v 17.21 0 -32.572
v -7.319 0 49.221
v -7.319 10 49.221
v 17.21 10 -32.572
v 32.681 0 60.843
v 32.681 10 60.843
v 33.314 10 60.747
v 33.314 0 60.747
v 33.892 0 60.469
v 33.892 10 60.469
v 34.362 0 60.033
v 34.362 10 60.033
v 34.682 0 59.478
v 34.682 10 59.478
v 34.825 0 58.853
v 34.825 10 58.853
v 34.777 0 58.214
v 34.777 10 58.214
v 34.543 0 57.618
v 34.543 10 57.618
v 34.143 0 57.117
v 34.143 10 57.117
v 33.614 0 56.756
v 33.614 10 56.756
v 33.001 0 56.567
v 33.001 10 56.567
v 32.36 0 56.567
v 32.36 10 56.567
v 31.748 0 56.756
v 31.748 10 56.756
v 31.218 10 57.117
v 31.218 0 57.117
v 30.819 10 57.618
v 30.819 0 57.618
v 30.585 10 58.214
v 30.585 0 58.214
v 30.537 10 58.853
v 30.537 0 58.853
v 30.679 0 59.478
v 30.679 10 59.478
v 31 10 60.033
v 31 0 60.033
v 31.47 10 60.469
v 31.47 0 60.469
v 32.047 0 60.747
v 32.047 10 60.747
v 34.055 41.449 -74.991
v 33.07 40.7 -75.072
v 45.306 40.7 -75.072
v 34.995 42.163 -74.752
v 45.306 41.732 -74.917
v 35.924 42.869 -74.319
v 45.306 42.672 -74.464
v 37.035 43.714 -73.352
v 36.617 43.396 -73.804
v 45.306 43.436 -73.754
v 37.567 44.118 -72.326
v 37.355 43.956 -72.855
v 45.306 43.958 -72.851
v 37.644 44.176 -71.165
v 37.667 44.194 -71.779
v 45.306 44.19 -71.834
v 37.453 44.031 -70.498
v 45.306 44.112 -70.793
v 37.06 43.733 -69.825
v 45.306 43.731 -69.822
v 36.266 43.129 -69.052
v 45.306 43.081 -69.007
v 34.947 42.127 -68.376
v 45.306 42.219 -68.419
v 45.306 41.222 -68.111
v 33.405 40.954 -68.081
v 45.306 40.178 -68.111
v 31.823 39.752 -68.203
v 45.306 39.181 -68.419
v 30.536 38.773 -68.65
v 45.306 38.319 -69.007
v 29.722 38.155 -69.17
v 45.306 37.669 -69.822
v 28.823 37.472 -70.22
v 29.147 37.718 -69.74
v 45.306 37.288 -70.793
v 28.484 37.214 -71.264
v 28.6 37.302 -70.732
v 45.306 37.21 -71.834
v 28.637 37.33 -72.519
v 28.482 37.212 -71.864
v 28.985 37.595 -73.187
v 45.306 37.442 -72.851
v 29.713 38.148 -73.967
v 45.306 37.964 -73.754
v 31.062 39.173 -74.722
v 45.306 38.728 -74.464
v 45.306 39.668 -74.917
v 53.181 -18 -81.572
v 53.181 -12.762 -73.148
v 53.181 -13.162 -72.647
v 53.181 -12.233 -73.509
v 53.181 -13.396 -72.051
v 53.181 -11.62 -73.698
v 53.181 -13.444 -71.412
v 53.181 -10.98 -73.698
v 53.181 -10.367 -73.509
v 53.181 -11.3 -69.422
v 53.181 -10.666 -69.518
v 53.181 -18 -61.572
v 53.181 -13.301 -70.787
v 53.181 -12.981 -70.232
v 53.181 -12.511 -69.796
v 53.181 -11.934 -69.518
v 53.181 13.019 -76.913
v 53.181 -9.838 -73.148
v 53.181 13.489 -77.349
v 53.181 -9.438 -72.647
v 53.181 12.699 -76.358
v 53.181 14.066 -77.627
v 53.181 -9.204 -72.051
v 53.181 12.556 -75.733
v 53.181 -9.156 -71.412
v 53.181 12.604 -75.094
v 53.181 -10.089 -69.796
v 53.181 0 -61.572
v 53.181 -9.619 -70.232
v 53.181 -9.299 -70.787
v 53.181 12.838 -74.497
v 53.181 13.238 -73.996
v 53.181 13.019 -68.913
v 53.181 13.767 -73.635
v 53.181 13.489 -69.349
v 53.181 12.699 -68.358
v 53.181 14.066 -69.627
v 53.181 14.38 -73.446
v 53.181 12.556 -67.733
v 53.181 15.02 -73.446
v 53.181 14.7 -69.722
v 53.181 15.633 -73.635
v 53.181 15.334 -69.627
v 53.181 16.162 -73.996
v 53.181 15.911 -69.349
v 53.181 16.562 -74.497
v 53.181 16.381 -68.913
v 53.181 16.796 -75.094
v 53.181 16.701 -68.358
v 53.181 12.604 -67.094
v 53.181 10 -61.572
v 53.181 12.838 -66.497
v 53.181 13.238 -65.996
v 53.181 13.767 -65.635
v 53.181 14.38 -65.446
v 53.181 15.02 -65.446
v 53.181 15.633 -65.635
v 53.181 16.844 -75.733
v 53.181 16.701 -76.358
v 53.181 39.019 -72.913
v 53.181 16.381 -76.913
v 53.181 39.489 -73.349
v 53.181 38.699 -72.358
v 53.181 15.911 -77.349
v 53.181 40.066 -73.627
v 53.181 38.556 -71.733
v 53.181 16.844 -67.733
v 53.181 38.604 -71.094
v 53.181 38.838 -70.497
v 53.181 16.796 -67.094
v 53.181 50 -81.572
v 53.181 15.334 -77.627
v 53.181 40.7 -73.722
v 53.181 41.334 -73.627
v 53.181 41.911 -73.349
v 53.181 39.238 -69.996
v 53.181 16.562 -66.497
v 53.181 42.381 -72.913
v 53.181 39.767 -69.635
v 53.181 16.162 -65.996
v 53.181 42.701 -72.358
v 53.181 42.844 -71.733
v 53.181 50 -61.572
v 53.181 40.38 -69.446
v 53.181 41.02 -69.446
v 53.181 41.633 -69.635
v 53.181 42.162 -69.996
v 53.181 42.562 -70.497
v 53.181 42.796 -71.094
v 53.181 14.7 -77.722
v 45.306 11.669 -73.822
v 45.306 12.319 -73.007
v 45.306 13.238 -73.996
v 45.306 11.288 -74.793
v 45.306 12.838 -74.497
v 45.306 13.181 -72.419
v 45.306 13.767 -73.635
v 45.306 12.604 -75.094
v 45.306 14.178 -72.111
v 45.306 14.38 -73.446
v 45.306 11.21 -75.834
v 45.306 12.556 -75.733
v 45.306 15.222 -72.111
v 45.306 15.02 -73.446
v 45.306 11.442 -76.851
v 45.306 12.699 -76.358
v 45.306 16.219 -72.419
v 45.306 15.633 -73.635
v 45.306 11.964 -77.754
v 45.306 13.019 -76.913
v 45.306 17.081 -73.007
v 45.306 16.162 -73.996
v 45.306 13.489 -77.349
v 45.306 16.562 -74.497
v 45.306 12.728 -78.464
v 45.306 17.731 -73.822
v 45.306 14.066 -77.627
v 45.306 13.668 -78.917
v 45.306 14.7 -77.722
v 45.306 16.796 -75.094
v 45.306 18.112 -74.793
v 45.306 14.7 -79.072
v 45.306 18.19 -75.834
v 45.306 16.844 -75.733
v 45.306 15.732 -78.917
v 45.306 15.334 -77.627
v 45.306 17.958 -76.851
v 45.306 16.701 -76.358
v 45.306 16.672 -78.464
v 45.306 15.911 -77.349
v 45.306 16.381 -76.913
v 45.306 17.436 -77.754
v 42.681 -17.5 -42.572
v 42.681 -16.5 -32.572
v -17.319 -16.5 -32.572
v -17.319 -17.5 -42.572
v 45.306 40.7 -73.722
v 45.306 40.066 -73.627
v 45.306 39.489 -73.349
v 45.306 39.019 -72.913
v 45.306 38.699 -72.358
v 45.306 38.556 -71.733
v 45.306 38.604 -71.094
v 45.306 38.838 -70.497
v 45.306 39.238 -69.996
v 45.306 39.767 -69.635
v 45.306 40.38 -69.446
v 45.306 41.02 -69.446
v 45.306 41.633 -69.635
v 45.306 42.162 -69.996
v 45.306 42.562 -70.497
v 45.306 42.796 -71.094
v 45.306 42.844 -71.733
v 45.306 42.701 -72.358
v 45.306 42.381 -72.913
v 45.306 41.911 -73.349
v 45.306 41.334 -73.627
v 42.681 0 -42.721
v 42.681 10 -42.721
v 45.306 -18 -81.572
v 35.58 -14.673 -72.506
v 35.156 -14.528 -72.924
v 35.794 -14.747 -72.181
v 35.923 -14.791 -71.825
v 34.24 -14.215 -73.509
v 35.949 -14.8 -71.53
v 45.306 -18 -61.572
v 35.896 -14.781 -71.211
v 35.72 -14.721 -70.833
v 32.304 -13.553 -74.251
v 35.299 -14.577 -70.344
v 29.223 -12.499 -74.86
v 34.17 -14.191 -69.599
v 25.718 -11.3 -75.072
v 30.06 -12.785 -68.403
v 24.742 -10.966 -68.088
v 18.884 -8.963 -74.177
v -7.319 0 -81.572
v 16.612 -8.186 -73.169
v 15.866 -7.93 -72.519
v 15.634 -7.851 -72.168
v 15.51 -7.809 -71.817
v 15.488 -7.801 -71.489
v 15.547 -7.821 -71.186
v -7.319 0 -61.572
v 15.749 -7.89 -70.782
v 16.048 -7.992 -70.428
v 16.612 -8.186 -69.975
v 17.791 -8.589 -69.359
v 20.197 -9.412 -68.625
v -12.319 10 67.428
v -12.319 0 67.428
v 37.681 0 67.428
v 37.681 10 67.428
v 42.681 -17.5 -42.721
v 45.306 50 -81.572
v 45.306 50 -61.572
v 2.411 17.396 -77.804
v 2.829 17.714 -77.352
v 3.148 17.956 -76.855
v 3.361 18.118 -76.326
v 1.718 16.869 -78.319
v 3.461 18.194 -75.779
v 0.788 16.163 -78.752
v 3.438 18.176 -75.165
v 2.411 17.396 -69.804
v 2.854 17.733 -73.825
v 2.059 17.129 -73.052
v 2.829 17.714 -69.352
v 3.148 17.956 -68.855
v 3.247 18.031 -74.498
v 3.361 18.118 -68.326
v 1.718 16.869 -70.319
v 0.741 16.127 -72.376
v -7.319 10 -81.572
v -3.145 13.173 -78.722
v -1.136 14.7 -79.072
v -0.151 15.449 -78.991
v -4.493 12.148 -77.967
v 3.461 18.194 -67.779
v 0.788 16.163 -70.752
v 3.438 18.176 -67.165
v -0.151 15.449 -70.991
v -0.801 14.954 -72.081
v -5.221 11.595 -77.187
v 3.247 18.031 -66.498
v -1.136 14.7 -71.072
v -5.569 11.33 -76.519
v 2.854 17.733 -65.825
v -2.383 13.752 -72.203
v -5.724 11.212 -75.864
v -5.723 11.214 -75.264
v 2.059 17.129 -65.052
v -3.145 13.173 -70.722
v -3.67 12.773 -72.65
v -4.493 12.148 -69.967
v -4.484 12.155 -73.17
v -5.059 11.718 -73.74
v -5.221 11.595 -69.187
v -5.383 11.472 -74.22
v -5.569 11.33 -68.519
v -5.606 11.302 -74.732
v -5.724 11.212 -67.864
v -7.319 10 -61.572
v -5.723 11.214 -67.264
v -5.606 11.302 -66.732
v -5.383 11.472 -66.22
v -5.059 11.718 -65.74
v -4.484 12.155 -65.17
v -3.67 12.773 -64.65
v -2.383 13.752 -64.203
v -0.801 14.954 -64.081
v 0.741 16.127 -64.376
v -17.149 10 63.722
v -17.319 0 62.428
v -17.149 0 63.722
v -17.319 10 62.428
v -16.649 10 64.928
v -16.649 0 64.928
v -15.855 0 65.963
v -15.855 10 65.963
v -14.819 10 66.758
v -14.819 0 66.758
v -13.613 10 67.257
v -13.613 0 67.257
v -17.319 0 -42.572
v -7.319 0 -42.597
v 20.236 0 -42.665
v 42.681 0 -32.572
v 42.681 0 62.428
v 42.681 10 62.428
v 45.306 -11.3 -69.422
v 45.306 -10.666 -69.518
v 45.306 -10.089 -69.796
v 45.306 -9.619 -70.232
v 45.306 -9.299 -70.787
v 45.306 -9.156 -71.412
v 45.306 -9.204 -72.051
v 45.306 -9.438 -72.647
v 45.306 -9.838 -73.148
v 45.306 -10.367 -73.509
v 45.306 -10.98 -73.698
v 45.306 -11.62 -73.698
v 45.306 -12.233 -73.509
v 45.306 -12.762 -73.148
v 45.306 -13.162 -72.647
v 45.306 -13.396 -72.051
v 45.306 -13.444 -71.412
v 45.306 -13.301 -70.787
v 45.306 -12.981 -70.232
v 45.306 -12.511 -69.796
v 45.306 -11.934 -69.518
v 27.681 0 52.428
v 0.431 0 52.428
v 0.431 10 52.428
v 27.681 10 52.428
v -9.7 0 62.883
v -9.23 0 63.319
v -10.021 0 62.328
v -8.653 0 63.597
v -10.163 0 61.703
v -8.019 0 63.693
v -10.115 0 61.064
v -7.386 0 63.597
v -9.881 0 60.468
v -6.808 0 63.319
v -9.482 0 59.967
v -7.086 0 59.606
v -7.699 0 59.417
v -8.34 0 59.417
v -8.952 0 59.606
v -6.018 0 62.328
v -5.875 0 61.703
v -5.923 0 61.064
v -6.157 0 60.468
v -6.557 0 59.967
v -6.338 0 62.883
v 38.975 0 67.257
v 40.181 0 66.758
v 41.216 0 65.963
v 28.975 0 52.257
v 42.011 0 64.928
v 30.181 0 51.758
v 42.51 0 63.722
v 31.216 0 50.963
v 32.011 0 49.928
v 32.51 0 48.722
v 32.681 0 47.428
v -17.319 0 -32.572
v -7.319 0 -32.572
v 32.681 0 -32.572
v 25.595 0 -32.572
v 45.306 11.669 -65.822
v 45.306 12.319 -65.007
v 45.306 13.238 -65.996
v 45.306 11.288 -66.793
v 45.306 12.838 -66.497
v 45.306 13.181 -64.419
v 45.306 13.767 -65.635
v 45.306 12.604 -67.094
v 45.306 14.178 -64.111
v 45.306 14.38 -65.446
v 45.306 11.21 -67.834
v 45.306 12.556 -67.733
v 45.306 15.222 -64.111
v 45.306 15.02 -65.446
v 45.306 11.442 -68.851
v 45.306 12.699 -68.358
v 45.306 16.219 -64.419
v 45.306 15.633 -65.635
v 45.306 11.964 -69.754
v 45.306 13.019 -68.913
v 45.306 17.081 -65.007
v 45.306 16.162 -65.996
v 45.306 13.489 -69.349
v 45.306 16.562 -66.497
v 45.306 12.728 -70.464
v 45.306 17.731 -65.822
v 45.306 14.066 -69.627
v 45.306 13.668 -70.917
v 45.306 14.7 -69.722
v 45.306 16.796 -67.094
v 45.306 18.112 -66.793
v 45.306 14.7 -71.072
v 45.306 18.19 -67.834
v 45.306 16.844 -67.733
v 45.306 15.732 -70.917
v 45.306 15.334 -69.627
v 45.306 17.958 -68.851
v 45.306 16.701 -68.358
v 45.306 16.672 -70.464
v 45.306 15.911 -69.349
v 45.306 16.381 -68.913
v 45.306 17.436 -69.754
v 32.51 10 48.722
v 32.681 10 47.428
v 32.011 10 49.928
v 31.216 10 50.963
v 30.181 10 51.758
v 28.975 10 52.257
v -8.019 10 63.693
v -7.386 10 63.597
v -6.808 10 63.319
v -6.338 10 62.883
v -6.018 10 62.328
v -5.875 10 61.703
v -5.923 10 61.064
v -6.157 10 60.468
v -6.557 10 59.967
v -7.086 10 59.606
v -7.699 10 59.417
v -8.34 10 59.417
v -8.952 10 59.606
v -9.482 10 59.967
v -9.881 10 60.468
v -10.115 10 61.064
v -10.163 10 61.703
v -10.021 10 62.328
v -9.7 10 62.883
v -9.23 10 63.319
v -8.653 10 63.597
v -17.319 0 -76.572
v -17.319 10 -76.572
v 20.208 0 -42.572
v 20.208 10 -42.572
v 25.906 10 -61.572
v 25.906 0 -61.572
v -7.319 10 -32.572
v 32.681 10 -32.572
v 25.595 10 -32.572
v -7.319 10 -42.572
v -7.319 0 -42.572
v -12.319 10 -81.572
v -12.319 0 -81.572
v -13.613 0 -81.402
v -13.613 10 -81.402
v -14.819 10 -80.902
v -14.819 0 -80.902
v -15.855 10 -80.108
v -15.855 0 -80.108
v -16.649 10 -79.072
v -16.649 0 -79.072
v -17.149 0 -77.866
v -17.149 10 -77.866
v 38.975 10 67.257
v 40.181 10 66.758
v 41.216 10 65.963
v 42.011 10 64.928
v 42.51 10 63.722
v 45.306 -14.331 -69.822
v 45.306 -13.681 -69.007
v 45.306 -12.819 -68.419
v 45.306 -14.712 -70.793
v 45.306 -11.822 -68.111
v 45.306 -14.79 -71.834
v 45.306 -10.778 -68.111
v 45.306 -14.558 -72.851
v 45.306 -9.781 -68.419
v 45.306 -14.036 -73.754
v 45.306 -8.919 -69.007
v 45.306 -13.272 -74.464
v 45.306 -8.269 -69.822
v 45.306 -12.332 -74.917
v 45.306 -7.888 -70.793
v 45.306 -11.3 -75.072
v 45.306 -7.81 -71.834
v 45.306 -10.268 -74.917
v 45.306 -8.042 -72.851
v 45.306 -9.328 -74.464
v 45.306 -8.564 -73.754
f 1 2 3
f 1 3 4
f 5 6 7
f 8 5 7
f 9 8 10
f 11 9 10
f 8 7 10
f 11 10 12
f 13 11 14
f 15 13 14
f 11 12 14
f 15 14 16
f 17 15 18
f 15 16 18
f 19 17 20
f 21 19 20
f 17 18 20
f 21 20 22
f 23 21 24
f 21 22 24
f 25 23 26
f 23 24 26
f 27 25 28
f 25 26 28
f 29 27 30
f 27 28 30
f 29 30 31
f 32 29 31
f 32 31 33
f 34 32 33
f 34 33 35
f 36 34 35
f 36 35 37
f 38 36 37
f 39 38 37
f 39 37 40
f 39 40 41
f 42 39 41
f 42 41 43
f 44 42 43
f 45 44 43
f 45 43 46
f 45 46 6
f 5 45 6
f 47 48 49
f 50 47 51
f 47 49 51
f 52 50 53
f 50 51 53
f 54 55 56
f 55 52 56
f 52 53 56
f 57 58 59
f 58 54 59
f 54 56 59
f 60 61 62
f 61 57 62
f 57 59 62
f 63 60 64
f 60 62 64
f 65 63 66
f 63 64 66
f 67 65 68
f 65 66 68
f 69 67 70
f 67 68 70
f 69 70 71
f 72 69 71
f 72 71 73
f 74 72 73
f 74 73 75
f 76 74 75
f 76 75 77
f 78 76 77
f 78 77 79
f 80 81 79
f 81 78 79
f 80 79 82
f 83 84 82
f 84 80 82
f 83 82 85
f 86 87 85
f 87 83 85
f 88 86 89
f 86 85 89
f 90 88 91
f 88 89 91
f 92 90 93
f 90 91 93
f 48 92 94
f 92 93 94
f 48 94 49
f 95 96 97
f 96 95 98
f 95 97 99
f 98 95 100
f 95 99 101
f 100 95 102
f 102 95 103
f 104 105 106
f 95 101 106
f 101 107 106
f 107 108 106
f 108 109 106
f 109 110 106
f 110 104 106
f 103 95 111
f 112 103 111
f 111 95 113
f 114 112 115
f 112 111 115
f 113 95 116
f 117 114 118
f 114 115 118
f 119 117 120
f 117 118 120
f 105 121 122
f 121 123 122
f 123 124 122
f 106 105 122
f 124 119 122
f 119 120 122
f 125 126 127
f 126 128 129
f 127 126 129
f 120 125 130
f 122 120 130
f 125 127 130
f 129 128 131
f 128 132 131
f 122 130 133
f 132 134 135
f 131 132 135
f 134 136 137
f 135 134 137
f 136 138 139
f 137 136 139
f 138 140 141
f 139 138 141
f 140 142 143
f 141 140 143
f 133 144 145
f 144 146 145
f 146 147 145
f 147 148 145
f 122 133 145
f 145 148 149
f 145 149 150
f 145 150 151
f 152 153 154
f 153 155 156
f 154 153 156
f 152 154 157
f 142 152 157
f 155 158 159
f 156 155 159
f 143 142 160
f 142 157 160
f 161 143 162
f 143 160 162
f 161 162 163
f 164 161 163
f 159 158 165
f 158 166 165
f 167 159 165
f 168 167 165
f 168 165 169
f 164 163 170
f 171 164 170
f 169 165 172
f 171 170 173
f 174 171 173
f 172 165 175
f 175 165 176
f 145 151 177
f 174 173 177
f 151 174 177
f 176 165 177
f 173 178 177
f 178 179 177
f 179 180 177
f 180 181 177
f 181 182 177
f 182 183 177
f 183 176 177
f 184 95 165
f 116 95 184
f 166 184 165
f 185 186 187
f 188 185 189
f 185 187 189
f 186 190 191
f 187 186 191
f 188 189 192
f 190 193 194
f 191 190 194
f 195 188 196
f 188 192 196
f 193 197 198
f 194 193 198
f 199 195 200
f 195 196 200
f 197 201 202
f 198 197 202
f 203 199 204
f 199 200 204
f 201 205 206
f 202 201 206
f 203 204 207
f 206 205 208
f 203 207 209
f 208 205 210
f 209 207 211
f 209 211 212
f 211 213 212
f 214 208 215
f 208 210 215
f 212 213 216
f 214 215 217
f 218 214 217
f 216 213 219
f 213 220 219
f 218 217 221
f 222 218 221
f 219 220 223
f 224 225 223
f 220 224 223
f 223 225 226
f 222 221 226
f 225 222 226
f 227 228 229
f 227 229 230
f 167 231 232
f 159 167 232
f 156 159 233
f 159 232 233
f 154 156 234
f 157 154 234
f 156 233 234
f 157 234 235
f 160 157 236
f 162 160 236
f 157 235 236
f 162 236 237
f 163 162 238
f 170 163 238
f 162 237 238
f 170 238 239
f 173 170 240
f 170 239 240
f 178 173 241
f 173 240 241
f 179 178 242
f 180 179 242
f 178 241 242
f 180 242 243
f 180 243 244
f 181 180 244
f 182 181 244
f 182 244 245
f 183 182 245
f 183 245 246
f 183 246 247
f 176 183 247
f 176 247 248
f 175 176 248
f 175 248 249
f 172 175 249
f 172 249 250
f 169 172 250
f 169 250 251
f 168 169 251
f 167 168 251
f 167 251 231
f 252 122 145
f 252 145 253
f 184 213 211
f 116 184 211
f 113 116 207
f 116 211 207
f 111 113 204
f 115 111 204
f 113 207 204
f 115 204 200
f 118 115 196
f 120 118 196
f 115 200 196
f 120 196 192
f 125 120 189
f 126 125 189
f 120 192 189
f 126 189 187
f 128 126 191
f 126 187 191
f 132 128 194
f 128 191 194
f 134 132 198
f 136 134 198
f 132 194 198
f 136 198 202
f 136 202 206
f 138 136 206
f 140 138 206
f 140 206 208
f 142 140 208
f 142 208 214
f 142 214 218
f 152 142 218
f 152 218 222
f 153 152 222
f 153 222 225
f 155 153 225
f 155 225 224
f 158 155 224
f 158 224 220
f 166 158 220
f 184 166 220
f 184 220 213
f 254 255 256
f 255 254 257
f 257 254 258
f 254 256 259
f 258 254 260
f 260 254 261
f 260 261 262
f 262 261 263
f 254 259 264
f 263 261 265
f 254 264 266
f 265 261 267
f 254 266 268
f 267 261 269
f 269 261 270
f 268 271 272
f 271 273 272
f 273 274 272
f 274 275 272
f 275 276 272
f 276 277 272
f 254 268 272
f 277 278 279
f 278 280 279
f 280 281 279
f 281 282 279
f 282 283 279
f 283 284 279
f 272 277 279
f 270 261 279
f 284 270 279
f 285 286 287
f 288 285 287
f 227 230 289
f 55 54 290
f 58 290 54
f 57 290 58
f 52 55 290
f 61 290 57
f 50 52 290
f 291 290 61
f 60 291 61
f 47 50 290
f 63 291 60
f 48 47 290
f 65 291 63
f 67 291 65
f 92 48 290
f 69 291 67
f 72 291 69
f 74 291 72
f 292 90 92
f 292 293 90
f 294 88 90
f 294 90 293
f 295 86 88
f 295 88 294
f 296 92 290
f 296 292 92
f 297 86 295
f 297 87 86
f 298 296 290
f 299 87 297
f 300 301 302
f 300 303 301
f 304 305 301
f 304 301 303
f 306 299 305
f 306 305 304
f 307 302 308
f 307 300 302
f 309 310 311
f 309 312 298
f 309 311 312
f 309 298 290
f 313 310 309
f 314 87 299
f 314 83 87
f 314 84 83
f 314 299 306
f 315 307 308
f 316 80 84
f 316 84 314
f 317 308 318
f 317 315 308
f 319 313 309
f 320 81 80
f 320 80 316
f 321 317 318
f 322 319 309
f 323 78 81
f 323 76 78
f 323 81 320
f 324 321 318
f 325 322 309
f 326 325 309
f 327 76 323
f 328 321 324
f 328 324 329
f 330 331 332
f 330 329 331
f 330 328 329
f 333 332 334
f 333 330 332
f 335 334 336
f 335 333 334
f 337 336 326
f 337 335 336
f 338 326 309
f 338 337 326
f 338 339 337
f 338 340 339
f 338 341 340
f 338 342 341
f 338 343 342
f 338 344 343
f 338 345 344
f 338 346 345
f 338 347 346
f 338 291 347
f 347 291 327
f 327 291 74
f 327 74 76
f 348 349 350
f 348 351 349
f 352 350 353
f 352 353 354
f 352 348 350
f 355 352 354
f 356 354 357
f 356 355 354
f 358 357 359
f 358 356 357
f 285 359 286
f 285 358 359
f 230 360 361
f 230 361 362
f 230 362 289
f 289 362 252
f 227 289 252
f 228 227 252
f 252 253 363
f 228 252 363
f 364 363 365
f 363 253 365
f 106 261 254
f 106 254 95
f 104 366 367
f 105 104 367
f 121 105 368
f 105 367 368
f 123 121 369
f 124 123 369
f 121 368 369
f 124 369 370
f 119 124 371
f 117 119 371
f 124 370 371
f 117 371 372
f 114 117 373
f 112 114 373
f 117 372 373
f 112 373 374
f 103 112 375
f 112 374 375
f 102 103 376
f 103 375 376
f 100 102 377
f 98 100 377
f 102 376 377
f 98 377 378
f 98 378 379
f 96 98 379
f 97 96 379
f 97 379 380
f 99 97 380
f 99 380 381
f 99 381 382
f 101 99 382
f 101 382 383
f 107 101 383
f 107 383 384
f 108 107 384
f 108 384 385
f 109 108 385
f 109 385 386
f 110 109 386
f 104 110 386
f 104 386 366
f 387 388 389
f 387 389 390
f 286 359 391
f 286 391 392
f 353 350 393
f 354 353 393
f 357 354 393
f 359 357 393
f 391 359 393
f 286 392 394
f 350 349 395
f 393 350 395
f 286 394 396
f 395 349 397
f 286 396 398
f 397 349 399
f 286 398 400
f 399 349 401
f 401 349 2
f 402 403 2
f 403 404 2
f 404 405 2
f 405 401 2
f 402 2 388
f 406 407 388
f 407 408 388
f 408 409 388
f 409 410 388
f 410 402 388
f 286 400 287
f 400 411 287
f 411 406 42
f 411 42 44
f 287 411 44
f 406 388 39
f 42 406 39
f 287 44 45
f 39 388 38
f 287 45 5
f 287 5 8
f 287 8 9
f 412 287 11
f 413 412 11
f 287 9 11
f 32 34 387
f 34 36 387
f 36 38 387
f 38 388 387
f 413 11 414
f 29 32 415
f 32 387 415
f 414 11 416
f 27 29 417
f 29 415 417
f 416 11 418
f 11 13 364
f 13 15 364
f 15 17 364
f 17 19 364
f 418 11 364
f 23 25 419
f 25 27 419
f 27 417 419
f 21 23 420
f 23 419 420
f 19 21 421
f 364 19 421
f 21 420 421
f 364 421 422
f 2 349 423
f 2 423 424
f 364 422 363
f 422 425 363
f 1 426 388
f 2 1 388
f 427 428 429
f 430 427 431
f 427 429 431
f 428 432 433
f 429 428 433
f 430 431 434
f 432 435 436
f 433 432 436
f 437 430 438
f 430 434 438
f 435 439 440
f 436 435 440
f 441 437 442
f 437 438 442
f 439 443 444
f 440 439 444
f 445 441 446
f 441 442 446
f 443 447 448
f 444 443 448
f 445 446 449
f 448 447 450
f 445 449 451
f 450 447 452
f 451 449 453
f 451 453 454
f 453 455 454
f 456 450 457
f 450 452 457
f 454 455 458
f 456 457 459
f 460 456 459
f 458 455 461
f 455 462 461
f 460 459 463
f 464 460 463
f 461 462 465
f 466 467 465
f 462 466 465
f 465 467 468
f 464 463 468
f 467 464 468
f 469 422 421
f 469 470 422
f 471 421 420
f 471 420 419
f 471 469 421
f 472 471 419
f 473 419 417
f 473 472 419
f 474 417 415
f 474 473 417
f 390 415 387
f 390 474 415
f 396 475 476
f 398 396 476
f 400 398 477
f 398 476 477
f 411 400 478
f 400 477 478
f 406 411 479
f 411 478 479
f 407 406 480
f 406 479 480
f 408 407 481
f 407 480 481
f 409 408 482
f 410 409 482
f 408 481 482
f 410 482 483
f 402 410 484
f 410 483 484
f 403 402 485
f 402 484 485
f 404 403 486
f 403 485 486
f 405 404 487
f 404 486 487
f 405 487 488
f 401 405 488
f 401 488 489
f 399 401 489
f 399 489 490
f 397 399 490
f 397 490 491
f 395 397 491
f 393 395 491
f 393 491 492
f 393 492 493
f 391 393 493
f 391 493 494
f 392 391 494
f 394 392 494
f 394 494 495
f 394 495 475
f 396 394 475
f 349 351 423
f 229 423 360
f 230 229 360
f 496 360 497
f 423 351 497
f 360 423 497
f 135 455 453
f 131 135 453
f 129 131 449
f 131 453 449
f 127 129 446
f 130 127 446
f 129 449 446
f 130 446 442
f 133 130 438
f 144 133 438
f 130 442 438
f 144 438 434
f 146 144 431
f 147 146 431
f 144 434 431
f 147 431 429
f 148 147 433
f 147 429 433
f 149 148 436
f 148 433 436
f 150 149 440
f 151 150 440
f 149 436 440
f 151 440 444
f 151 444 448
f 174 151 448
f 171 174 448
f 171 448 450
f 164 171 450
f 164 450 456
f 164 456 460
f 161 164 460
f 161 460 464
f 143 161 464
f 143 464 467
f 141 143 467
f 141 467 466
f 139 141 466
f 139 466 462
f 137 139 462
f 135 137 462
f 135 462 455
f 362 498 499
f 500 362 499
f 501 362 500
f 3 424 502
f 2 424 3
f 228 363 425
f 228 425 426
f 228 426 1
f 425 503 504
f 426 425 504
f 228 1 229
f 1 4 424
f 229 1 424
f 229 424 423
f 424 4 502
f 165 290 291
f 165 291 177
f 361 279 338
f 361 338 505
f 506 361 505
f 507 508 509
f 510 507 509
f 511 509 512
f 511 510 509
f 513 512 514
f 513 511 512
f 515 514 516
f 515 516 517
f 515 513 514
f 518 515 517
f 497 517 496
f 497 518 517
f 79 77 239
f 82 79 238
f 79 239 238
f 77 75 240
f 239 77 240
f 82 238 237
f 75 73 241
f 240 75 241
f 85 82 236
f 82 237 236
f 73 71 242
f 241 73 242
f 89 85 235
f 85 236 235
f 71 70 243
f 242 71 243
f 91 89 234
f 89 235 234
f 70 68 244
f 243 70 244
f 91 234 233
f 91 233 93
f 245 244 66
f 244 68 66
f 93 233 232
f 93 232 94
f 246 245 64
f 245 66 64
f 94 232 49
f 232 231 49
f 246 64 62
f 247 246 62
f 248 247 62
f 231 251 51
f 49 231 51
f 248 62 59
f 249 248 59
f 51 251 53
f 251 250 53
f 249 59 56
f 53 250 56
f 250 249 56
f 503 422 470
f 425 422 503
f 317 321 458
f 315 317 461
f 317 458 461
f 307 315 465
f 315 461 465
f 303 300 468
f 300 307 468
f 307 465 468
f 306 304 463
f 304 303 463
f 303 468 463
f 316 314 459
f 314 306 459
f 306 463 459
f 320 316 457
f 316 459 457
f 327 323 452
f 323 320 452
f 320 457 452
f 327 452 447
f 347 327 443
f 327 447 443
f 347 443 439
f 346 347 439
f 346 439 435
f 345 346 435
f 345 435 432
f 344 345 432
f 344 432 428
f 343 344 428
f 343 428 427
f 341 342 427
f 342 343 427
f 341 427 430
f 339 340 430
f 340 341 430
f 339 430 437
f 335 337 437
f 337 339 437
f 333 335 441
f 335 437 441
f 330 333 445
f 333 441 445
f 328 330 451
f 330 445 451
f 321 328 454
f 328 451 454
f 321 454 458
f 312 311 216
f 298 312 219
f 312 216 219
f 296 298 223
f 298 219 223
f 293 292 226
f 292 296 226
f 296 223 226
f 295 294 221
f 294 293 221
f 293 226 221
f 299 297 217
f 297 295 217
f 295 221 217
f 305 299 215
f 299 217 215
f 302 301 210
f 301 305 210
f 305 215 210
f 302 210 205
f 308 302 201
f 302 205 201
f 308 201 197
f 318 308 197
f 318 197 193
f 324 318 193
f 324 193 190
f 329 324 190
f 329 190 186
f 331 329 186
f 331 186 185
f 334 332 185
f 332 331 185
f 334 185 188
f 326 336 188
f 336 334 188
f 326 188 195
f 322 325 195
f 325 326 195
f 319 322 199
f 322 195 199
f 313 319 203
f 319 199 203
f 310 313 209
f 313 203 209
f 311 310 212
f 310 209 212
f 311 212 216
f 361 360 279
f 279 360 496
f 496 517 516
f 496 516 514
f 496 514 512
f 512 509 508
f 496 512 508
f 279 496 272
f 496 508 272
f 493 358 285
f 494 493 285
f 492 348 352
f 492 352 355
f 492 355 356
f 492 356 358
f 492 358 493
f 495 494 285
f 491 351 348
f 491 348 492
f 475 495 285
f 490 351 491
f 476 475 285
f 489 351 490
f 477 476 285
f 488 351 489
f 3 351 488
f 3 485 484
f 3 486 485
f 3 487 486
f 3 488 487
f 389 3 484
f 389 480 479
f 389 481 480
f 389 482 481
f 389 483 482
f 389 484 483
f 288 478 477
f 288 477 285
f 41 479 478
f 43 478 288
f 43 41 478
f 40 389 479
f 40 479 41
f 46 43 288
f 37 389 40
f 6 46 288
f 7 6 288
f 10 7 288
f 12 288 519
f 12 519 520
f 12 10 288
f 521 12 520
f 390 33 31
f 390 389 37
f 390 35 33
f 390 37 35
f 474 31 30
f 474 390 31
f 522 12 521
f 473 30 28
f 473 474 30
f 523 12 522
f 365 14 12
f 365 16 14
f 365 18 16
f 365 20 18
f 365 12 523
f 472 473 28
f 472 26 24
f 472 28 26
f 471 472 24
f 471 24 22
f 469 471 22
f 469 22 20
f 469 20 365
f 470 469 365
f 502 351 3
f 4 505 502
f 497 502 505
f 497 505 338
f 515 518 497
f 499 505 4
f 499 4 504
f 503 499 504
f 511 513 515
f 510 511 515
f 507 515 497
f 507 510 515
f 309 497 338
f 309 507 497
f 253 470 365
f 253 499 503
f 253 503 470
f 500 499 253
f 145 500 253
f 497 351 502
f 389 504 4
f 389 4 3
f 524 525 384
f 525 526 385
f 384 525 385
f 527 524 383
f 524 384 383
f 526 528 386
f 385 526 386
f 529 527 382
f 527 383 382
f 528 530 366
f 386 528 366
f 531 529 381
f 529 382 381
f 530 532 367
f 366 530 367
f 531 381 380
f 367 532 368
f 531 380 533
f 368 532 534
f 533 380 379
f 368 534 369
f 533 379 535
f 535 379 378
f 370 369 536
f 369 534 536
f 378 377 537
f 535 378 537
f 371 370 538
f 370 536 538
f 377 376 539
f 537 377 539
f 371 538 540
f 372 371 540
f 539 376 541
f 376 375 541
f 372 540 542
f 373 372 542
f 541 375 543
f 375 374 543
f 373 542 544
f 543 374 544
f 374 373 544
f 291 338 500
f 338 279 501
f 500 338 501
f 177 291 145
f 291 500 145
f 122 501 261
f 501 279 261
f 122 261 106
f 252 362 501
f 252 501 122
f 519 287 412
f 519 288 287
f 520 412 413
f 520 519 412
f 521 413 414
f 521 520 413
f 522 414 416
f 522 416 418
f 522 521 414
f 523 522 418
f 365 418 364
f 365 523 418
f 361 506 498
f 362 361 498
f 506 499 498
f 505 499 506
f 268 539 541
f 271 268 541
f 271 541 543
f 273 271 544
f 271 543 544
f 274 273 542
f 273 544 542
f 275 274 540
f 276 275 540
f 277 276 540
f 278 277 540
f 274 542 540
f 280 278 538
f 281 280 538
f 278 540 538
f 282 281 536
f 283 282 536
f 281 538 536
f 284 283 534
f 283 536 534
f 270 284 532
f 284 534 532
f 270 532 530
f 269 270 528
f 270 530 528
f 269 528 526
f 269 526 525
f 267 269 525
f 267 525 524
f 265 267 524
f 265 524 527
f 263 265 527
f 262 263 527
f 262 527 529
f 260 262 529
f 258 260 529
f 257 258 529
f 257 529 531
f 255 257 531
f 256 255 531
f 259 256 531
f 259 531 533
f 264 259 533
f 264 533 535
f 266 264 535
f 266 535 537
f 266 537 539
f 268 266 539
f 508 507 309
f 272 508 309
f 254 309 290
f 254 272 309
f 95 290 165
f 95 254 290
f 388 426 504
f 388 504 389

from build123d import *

# Parameters (mm, degrees)
EXTRUDE_1_DEPTH                 = 10
SKETCH_4_W                      = 7.875
SKETCH_4_H                      = 20
EXTRUDE_2_DEPTH                 = 40
CUT_EXTRUDE_1_REACH             = 116.35
SKETCH_5_R                      = 2.15
CUT_EXTRUDE_1_DIRECTION_2_DEPTH = 53
CUT_EXTRUDE_2_REACH             = 107.272
SKETCH_6_R                      = 2.15
FILLET_1_R                      = 5
FILLET_2_R                      = 5
SKETCH_7_W                      = 7.875
SKETCH_7_H                      = 20
EXTRUDE_3_DEPTH                 = 18
CUT_EXTRUDE_3_REACH             = 116.35
SKETCH_8_R                      = 2.15
EXTRUDE_8_DEPTH                 = 20
SKETCH_15_W                     = 52.625
SKETCH_15_H                     = 20
EXTRUDE_9_DEPTH                 = 40
CUT_EXTRUDE_START               = -7.875
SKETCH_14_R                     = 3.5
CUT_EXTRUDE_8_DEPTH             = 54
CUT_EXTRUDE_10_DEPTH            = 20
EXTRUDE_10_DEPTH                = 10
EXTRUDE_11_DEPTH                = 17.5
CUT_EXTRUDE_11_DEPTH            = 64


with BuildPart() as part:
    # 草图1 → 凸台-拉伸1 (new body)
    with BuildSketch(Plane(origin=(0, 0, 0), x_dir=(1, 0, 0), z_dir=(0, 1, 0))):
        Polygon((5.931150433, 81.572237736), (53.180774799, 81.572237736), (53.180774799, 61.572237736), (42.680774799, 42.721022935), (42.680774799, 31.757290204), (42.680774799, -57.600660719), (42.680774799, -67.427762264), (0.431150433, -67.427762264), (-17.319225201, -67.427762264), (-17.319225201, 81.572237736), align=None)
        Polygon((47.930774799, 61.572237736), (42.680774799, 61.572237736), (42.680774799, 52.689495612), align=None, mode=Mode.SUBTRACT)
        Polygon((25.906315323, 61.572237736), (-7.319225201, 61.572237736), (-7.319225201, -49.220735683), align=None, mode=Mode.SUBTRACT)
        Polygon((0.431150433, -52.427762264), (32.680774799, -52.427762264), (32.680774799, 56.508121895), align=None, mode=Mode.SUBTRACT)
    extrude(amount=EXTRUDE_1_DEPTH)

    # 草图4 → 凸台-拉伸2 (add)
    with BuildSketch(Plane(origin=(0, 10, 0), x_dir=(1, 0, 0), z_dir=(0, 1, 0))):
        with Locations((49.243274799, 71.572237736)):
            Rectangle(SKETCH_4_W, SKETCH_4_H)
    extrude(amount=EXTRUDE_2_DEPTH)

    # 草图5 → 切除-拉伸1 (cut, up to next)
    with BuildSketch(Plane.ZY.offset(-45.305774799), mode=Mode.PRIVATE) as cut_extrude_1_sk1:
        with Locations(Location((-75.572237736, 14.7, 0), (0, 0, 180))):
            Circle(SKETCH_5_R)
    cut_extrude_1_tool1 = extrude(cut_extrude_1_sk1.sketch, amount=-CUT_EXTRUDE_1_REACH, mode=Mode.PRIVATE) & part.part
    # 草图5 → 切除-拉伸1 (cut, up to next)
    with BuildSketch(Plane.ZY.offset(-45.305774799), mode=Mode.PRIVATE) as cut_extrude_1_sk2:
        with Locations(Location((-67.572237736, 14.7, 0), (0, 0, 180))):
            Circle(SKETCH_5_R)
    cut_extrude_1_tool2 = extrude(cut_extrude_1_sk2.sketch, amount=-CUT_EXTRUDE_1_REACH, mode=Mode.PRIVATE) & part.part
    # 草图5 → 切除-拉伸1 (cut, up to next)
    with BuildSketch(Plane.ZY.offset(-45.305774799), mode=Mode.PRIVATE) as cut_extrude_1_sk3:
        with Locations(Location((-71.572237736, 40.7, 0), (0, 0, 180))):
            Circle(SKETCH_5_R)
    cut_extrude_1_tool3 = extrude(cut_extrude_1_sk3.sketch, amount=-CUT_EXTRUDE_1_REACH, mode=Mode.PRIVATE) & part.part
    add(cut_extrude_1_tool1.solids().sort_by_distance((45.305775, 14.7, -75.572238))[0], mode=Mode.SUBTRACT)
    add(cut_extrude_1_tool2.solids().sort_by_distance((45.305775, 14.7, -67.572238))[0], mode=Mode.SUBTRACT)
    add(cut_extrude_1_tool3.solids().sort_by_distance((45.305775, 40.7, -71.572238))[0], mode=Mode.SUBTRACT)

    # 草图5 → 切除-拉伸1 direction 2 (cut)
    with BuildSketch(Plane.ZY.offset(-45.305774799)):
        with Locations(Location((-75.572237736, 14.7, 0), (0, 0, 180))):
            Circle(SKETCH_5_R)
        with Locations(Location((-67.572237736, 14.7, 0), (0, 0, 180))):
            Circle(SKETCH_5_R)
        with Locations(Location((-71.572237736, 40.7, 0), (0, 0, 180))):
            Circle(SKETCH_5_R)
    extrude(amount=CUT_EXTRUDE_1_DIRECTION_2_DEPTH, mode=Mode.SUBTRACT)

    # 草图6 → 切除-拉伸2 (cut, up to next)
    with BuildSketch(Plane(origin=(0, 10, 0), x_dir=(1, 0, 0), z_dir=(0, 1, 0)), mode=Mode.PRIVATE) as cut_extrude_2_sk1:
        with Locations(Location((-8.019225201, -61.542634482, 0), (0, 0, 270))):
            Circle(SKETCH_6_R)
    cut_extrude_2_tool1 = extrude(cut_extrude_2_sk1.sketch, amount=-CUT_EXTRUDE_2_REACH, mode=Mode.PRIVATE) & part.part
    # 草图6 → 切除-拉伸2 (cut, up to next)
    with BuildSketch(Plane(origin=(0, 10, 0), x_dir=(1, 0, 0), z_dir=(0, 1, 0)), mode=Mode.PRIVATE) as cut_extrude_2_sk2:
        with Locations(Location((32.680774799, -58.692634482, 0), (0, 0, 270))):
            Circle(SKETCH_6_R)
    cut_extrude_2_tool2 = extrude(cut_extrude_2_sk2.sketch, amount=-CUT_EXTRUDE_2_REACH, mode=Mode.PRIVATE) & part.part
    add(cut_extrude_2_tool1.solids().sort_by_distance((-8.019225, 10, 61.542634))[0], mode=Mode.SUBTRACT)
    add(cut_extrude_2_tool2.solids().sort_by_distance((32.680775, 10, 58.692634))[0], mode=Mode.SUBTRACT)

    # 圆角1
    fillet_1_edges = [part.edges().sort_by_distance(p)[0] for p in [
        (-17.319225201, 5, 67.427762264),
        (-17.319225201, 5, -81.572237736),
        (42.680774799, 5, 67.427762264),
    ]]
    fillet(fillet_1_edges, radius=FILLET_1_R)

    # 圆角2
    fillet_2_edges = [part.edges().sort_by_distance(p)[0] for p in [
        (32.680774799, 5, 52.427762264),
    ]]
    fillet(fillet_2_edges, radius=FILLET_2_R)

    # 草图7 → 凸台-拉伸3 (add)
    with BuildSketch(Plane.XZ):
        with Locations((49.243274799, -71.572237736)):
            Rectangle(SKETCH_7_W, SKETCH_7_H)
    extrude(amount=EXTRUDE_3_DEPTH)

    # 草图8 → 切除-拉伸3 (cut, up to next)
    with BuildSketch(Plane.ZY.offset(-45.305774799), mode=Mode.PRIVATE) as cut_extrude_3_sk1:
        with Locations((-71.572237736, -11.3)):
            Circle(SKETCH_8_R)
    cut_extrude_3_tool1 = extrude(cut_extrude_3_sk1.sketch, amount=-CUT_EXTRUDE_3_REACH, mode=Mode.PRIVATE) & part.part
    add(cut_extrude_3_tool1.solids().sort_by_distance((45.305775, -11.3, -71.572238))[0], mode=Mode.SUBTRACT)

    # 草图13 → 凸台-拉伸8 (add)
    with BuildSketch(Plane.XY.offset(-61.572237736)):
        Polygon((45.305774799, 0), (45.305774799, -18), (-7.319225201, 0), align=None)
    extrude(amount=-EXTRUDE_8_DEPTH)

    # 草图15 → 凸台-拉伸9 (add)
    with BuildSketch(Plane(origin=(0, 10, 0), x_dir=(1, 0, 0), z_dir=(0, 1, 0))):
        with Locations((18.993274799, 71.572237736)):
            Rectangle(SKETCH_15_W, SKETCH_15_H)
    extrude(amount=EXTRUDE_9_DEPTH)

    # 草图14 → 切除-拉伸8 (cut)
    with BuildSketch(Plane(origin=(53.180774799, 0, 0), x_dir=(0, 0, -1), z_dir=(1, 0, 0)).offset(CUT_EXTRUDE_START)):
        with Locations((71.572237736, 40.7)):
            Circle(SKETCH_14_R)
        with Locations((67.572237736, 14.7)):
            Circle(SKETCH_14_R)
        with Locations((75.572237736, 14.7)):
            Circle(SKETCH_14_R)
        with Locations((71.572237736, -11.3)):
            Circle(SKETCH_14_R)
    extrude(amount=-CUT_EXTRUDE_8_DEPTH, mode=Mode.SUBTRACT)

    # 草图17 → 切除-拉伸10 (cut)
    with BuildSketch(Plane.XY.offset(-61.572237736)):
        Polygon((-7.319225201, 10), (-7.319225201, 50), (45.305774799, 50), align=None)
    extrude(amount=-CUT_EXTRUDE_10_DEPTH, mode=Mode.SUBTRACT)

    # 草图18 → 凸台-拉伸10 (add)
    with BuildSketch(Plane(origin=(0, 10, 0), x_dir=(1, 0, 0), z_dir=(0, 1, 0))):
        Polygon((-7.319225201, 32.572237736), (17.209548321, 32.572237736), (20.208433494, 42.572237736), (-7.319225201, 42.572237736), align=None)
        Polygon((25.594741772, 32.572237736), (32.680774799, 32.572237736), (32.680774799, 56.508121895), align=None)
        Polygon((42.680774799, 61.572237736), (42.680774799, 52.689495612), (47.930774799, 61.572237736), align=None)
    extrude(amount=-EXTRUDE_10_DEPTH)

    # 草图19 → 凸台-拉伸11 (add)
    with BuildSketch(Plane.XZ):
        Polygon((-17.319225201, -32.572237736), (-17.319225201, -42.572237736), (42.680774799, -42.721022935), (42.680774799, -32.572237736), align=None)
    extrude(amount=EXTRUDE_11_DEPTH)

    # 草图20 → 切除-拉伸11 (cut)
    with BuildSketch(Plane.ZY.offset(17.319225201)):
        Polygon((-42.572237736, -17.5), (-32.572237736, -17.5), (-32.572237736, -16.5), align=None)
    extrude(amount=-CUT_EXTRUDE_11_DEPTH, mode=Mode.SUBTRACT)


solid = part.part
